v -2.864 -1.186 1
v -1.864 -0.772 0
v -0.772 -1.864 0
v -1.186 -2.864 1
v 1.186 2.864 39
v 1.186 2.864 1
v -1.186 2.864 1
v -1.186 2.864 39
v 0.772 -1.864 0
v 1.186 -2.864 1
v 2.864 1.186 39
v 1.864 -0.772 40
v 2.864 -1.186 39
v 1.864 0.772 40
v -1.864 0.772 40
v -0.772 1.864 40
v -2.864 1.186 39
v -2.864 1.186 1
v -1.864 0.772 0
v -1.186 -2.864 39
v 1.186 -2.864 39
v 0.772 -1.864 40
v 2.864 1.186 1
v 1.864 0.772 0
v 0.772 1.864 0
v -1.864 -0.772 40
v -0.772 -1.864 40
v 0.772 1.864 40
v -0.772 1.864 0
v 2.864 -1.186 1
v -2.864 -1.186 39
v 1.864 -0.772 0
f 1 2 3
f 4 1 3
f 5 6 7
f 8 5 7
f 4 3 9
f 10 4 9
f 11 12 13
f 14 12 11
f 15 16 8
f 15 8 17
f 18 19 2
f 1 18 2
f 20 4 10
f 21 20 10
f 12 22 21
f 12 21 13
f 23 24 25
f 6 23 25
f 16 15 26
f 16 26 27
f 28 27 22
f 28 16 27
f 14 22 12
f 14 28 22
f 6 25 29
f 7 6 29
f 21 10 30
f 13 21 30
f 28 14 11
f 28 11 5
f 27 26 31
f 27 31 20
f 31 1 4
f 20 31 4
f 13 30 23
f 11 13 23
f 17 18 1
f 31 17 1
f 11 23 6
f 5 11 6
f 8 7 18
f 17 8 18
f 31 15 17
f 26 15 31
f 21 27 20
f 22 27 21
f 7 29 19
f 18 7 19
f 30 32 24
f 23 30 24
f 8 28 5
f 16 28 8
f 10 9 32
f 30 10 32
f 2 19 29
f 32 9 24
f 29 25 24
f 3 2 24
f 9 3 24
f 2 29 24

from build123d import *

# Parameters (mm, degrees)
F1_DEPTH = 40
F2_SIZE  = 1


with BuildPart() as f1:
    # F0 (on Top) → F1 (new body)
    with BuildSketch(Plane.XY):
        Polygon((2.864027, -1.186319), (2.864027, 1.186319), (1.186319, 2.864027), (-1.186319, 2.864027), (-2.864027, 1.186319), (-2.864027, -1.186319), (-1.186319, -2.864027), (1.186319, -2.864027), align=None)
    extrude(amount=F1_DEPTH)

    # F2
    f2_edges = [f1.edges().sort_by_distance(p)[0] for p in [
        (2.025173, -2.025173, 40),
        (2.864027, 0, 40),
        (2.025173, 2.025173, 40),
        (0, 2.864027, 40),
        (-2.025173, 2.025173, 40),
        (-2.864027, 0, 40),
        (-2.025173, -2.025173, 40),
        (0, -2.864027, 40),
        (2.025173, -2.025173, 0),
        (2.864027, 0, 0),
        (2.025173, 2.025173, 0),
        (0, 2.864027, 0),
        (-2.025173, 2.025173, 0),
        (-2.864027, 0, 0),
        (-2.025173, -2.025173, 0),
        (0, -2.864027, 0),
    ]]
    chamfer(f2_edges, length=F2_SIZE)


solid = f1.part
